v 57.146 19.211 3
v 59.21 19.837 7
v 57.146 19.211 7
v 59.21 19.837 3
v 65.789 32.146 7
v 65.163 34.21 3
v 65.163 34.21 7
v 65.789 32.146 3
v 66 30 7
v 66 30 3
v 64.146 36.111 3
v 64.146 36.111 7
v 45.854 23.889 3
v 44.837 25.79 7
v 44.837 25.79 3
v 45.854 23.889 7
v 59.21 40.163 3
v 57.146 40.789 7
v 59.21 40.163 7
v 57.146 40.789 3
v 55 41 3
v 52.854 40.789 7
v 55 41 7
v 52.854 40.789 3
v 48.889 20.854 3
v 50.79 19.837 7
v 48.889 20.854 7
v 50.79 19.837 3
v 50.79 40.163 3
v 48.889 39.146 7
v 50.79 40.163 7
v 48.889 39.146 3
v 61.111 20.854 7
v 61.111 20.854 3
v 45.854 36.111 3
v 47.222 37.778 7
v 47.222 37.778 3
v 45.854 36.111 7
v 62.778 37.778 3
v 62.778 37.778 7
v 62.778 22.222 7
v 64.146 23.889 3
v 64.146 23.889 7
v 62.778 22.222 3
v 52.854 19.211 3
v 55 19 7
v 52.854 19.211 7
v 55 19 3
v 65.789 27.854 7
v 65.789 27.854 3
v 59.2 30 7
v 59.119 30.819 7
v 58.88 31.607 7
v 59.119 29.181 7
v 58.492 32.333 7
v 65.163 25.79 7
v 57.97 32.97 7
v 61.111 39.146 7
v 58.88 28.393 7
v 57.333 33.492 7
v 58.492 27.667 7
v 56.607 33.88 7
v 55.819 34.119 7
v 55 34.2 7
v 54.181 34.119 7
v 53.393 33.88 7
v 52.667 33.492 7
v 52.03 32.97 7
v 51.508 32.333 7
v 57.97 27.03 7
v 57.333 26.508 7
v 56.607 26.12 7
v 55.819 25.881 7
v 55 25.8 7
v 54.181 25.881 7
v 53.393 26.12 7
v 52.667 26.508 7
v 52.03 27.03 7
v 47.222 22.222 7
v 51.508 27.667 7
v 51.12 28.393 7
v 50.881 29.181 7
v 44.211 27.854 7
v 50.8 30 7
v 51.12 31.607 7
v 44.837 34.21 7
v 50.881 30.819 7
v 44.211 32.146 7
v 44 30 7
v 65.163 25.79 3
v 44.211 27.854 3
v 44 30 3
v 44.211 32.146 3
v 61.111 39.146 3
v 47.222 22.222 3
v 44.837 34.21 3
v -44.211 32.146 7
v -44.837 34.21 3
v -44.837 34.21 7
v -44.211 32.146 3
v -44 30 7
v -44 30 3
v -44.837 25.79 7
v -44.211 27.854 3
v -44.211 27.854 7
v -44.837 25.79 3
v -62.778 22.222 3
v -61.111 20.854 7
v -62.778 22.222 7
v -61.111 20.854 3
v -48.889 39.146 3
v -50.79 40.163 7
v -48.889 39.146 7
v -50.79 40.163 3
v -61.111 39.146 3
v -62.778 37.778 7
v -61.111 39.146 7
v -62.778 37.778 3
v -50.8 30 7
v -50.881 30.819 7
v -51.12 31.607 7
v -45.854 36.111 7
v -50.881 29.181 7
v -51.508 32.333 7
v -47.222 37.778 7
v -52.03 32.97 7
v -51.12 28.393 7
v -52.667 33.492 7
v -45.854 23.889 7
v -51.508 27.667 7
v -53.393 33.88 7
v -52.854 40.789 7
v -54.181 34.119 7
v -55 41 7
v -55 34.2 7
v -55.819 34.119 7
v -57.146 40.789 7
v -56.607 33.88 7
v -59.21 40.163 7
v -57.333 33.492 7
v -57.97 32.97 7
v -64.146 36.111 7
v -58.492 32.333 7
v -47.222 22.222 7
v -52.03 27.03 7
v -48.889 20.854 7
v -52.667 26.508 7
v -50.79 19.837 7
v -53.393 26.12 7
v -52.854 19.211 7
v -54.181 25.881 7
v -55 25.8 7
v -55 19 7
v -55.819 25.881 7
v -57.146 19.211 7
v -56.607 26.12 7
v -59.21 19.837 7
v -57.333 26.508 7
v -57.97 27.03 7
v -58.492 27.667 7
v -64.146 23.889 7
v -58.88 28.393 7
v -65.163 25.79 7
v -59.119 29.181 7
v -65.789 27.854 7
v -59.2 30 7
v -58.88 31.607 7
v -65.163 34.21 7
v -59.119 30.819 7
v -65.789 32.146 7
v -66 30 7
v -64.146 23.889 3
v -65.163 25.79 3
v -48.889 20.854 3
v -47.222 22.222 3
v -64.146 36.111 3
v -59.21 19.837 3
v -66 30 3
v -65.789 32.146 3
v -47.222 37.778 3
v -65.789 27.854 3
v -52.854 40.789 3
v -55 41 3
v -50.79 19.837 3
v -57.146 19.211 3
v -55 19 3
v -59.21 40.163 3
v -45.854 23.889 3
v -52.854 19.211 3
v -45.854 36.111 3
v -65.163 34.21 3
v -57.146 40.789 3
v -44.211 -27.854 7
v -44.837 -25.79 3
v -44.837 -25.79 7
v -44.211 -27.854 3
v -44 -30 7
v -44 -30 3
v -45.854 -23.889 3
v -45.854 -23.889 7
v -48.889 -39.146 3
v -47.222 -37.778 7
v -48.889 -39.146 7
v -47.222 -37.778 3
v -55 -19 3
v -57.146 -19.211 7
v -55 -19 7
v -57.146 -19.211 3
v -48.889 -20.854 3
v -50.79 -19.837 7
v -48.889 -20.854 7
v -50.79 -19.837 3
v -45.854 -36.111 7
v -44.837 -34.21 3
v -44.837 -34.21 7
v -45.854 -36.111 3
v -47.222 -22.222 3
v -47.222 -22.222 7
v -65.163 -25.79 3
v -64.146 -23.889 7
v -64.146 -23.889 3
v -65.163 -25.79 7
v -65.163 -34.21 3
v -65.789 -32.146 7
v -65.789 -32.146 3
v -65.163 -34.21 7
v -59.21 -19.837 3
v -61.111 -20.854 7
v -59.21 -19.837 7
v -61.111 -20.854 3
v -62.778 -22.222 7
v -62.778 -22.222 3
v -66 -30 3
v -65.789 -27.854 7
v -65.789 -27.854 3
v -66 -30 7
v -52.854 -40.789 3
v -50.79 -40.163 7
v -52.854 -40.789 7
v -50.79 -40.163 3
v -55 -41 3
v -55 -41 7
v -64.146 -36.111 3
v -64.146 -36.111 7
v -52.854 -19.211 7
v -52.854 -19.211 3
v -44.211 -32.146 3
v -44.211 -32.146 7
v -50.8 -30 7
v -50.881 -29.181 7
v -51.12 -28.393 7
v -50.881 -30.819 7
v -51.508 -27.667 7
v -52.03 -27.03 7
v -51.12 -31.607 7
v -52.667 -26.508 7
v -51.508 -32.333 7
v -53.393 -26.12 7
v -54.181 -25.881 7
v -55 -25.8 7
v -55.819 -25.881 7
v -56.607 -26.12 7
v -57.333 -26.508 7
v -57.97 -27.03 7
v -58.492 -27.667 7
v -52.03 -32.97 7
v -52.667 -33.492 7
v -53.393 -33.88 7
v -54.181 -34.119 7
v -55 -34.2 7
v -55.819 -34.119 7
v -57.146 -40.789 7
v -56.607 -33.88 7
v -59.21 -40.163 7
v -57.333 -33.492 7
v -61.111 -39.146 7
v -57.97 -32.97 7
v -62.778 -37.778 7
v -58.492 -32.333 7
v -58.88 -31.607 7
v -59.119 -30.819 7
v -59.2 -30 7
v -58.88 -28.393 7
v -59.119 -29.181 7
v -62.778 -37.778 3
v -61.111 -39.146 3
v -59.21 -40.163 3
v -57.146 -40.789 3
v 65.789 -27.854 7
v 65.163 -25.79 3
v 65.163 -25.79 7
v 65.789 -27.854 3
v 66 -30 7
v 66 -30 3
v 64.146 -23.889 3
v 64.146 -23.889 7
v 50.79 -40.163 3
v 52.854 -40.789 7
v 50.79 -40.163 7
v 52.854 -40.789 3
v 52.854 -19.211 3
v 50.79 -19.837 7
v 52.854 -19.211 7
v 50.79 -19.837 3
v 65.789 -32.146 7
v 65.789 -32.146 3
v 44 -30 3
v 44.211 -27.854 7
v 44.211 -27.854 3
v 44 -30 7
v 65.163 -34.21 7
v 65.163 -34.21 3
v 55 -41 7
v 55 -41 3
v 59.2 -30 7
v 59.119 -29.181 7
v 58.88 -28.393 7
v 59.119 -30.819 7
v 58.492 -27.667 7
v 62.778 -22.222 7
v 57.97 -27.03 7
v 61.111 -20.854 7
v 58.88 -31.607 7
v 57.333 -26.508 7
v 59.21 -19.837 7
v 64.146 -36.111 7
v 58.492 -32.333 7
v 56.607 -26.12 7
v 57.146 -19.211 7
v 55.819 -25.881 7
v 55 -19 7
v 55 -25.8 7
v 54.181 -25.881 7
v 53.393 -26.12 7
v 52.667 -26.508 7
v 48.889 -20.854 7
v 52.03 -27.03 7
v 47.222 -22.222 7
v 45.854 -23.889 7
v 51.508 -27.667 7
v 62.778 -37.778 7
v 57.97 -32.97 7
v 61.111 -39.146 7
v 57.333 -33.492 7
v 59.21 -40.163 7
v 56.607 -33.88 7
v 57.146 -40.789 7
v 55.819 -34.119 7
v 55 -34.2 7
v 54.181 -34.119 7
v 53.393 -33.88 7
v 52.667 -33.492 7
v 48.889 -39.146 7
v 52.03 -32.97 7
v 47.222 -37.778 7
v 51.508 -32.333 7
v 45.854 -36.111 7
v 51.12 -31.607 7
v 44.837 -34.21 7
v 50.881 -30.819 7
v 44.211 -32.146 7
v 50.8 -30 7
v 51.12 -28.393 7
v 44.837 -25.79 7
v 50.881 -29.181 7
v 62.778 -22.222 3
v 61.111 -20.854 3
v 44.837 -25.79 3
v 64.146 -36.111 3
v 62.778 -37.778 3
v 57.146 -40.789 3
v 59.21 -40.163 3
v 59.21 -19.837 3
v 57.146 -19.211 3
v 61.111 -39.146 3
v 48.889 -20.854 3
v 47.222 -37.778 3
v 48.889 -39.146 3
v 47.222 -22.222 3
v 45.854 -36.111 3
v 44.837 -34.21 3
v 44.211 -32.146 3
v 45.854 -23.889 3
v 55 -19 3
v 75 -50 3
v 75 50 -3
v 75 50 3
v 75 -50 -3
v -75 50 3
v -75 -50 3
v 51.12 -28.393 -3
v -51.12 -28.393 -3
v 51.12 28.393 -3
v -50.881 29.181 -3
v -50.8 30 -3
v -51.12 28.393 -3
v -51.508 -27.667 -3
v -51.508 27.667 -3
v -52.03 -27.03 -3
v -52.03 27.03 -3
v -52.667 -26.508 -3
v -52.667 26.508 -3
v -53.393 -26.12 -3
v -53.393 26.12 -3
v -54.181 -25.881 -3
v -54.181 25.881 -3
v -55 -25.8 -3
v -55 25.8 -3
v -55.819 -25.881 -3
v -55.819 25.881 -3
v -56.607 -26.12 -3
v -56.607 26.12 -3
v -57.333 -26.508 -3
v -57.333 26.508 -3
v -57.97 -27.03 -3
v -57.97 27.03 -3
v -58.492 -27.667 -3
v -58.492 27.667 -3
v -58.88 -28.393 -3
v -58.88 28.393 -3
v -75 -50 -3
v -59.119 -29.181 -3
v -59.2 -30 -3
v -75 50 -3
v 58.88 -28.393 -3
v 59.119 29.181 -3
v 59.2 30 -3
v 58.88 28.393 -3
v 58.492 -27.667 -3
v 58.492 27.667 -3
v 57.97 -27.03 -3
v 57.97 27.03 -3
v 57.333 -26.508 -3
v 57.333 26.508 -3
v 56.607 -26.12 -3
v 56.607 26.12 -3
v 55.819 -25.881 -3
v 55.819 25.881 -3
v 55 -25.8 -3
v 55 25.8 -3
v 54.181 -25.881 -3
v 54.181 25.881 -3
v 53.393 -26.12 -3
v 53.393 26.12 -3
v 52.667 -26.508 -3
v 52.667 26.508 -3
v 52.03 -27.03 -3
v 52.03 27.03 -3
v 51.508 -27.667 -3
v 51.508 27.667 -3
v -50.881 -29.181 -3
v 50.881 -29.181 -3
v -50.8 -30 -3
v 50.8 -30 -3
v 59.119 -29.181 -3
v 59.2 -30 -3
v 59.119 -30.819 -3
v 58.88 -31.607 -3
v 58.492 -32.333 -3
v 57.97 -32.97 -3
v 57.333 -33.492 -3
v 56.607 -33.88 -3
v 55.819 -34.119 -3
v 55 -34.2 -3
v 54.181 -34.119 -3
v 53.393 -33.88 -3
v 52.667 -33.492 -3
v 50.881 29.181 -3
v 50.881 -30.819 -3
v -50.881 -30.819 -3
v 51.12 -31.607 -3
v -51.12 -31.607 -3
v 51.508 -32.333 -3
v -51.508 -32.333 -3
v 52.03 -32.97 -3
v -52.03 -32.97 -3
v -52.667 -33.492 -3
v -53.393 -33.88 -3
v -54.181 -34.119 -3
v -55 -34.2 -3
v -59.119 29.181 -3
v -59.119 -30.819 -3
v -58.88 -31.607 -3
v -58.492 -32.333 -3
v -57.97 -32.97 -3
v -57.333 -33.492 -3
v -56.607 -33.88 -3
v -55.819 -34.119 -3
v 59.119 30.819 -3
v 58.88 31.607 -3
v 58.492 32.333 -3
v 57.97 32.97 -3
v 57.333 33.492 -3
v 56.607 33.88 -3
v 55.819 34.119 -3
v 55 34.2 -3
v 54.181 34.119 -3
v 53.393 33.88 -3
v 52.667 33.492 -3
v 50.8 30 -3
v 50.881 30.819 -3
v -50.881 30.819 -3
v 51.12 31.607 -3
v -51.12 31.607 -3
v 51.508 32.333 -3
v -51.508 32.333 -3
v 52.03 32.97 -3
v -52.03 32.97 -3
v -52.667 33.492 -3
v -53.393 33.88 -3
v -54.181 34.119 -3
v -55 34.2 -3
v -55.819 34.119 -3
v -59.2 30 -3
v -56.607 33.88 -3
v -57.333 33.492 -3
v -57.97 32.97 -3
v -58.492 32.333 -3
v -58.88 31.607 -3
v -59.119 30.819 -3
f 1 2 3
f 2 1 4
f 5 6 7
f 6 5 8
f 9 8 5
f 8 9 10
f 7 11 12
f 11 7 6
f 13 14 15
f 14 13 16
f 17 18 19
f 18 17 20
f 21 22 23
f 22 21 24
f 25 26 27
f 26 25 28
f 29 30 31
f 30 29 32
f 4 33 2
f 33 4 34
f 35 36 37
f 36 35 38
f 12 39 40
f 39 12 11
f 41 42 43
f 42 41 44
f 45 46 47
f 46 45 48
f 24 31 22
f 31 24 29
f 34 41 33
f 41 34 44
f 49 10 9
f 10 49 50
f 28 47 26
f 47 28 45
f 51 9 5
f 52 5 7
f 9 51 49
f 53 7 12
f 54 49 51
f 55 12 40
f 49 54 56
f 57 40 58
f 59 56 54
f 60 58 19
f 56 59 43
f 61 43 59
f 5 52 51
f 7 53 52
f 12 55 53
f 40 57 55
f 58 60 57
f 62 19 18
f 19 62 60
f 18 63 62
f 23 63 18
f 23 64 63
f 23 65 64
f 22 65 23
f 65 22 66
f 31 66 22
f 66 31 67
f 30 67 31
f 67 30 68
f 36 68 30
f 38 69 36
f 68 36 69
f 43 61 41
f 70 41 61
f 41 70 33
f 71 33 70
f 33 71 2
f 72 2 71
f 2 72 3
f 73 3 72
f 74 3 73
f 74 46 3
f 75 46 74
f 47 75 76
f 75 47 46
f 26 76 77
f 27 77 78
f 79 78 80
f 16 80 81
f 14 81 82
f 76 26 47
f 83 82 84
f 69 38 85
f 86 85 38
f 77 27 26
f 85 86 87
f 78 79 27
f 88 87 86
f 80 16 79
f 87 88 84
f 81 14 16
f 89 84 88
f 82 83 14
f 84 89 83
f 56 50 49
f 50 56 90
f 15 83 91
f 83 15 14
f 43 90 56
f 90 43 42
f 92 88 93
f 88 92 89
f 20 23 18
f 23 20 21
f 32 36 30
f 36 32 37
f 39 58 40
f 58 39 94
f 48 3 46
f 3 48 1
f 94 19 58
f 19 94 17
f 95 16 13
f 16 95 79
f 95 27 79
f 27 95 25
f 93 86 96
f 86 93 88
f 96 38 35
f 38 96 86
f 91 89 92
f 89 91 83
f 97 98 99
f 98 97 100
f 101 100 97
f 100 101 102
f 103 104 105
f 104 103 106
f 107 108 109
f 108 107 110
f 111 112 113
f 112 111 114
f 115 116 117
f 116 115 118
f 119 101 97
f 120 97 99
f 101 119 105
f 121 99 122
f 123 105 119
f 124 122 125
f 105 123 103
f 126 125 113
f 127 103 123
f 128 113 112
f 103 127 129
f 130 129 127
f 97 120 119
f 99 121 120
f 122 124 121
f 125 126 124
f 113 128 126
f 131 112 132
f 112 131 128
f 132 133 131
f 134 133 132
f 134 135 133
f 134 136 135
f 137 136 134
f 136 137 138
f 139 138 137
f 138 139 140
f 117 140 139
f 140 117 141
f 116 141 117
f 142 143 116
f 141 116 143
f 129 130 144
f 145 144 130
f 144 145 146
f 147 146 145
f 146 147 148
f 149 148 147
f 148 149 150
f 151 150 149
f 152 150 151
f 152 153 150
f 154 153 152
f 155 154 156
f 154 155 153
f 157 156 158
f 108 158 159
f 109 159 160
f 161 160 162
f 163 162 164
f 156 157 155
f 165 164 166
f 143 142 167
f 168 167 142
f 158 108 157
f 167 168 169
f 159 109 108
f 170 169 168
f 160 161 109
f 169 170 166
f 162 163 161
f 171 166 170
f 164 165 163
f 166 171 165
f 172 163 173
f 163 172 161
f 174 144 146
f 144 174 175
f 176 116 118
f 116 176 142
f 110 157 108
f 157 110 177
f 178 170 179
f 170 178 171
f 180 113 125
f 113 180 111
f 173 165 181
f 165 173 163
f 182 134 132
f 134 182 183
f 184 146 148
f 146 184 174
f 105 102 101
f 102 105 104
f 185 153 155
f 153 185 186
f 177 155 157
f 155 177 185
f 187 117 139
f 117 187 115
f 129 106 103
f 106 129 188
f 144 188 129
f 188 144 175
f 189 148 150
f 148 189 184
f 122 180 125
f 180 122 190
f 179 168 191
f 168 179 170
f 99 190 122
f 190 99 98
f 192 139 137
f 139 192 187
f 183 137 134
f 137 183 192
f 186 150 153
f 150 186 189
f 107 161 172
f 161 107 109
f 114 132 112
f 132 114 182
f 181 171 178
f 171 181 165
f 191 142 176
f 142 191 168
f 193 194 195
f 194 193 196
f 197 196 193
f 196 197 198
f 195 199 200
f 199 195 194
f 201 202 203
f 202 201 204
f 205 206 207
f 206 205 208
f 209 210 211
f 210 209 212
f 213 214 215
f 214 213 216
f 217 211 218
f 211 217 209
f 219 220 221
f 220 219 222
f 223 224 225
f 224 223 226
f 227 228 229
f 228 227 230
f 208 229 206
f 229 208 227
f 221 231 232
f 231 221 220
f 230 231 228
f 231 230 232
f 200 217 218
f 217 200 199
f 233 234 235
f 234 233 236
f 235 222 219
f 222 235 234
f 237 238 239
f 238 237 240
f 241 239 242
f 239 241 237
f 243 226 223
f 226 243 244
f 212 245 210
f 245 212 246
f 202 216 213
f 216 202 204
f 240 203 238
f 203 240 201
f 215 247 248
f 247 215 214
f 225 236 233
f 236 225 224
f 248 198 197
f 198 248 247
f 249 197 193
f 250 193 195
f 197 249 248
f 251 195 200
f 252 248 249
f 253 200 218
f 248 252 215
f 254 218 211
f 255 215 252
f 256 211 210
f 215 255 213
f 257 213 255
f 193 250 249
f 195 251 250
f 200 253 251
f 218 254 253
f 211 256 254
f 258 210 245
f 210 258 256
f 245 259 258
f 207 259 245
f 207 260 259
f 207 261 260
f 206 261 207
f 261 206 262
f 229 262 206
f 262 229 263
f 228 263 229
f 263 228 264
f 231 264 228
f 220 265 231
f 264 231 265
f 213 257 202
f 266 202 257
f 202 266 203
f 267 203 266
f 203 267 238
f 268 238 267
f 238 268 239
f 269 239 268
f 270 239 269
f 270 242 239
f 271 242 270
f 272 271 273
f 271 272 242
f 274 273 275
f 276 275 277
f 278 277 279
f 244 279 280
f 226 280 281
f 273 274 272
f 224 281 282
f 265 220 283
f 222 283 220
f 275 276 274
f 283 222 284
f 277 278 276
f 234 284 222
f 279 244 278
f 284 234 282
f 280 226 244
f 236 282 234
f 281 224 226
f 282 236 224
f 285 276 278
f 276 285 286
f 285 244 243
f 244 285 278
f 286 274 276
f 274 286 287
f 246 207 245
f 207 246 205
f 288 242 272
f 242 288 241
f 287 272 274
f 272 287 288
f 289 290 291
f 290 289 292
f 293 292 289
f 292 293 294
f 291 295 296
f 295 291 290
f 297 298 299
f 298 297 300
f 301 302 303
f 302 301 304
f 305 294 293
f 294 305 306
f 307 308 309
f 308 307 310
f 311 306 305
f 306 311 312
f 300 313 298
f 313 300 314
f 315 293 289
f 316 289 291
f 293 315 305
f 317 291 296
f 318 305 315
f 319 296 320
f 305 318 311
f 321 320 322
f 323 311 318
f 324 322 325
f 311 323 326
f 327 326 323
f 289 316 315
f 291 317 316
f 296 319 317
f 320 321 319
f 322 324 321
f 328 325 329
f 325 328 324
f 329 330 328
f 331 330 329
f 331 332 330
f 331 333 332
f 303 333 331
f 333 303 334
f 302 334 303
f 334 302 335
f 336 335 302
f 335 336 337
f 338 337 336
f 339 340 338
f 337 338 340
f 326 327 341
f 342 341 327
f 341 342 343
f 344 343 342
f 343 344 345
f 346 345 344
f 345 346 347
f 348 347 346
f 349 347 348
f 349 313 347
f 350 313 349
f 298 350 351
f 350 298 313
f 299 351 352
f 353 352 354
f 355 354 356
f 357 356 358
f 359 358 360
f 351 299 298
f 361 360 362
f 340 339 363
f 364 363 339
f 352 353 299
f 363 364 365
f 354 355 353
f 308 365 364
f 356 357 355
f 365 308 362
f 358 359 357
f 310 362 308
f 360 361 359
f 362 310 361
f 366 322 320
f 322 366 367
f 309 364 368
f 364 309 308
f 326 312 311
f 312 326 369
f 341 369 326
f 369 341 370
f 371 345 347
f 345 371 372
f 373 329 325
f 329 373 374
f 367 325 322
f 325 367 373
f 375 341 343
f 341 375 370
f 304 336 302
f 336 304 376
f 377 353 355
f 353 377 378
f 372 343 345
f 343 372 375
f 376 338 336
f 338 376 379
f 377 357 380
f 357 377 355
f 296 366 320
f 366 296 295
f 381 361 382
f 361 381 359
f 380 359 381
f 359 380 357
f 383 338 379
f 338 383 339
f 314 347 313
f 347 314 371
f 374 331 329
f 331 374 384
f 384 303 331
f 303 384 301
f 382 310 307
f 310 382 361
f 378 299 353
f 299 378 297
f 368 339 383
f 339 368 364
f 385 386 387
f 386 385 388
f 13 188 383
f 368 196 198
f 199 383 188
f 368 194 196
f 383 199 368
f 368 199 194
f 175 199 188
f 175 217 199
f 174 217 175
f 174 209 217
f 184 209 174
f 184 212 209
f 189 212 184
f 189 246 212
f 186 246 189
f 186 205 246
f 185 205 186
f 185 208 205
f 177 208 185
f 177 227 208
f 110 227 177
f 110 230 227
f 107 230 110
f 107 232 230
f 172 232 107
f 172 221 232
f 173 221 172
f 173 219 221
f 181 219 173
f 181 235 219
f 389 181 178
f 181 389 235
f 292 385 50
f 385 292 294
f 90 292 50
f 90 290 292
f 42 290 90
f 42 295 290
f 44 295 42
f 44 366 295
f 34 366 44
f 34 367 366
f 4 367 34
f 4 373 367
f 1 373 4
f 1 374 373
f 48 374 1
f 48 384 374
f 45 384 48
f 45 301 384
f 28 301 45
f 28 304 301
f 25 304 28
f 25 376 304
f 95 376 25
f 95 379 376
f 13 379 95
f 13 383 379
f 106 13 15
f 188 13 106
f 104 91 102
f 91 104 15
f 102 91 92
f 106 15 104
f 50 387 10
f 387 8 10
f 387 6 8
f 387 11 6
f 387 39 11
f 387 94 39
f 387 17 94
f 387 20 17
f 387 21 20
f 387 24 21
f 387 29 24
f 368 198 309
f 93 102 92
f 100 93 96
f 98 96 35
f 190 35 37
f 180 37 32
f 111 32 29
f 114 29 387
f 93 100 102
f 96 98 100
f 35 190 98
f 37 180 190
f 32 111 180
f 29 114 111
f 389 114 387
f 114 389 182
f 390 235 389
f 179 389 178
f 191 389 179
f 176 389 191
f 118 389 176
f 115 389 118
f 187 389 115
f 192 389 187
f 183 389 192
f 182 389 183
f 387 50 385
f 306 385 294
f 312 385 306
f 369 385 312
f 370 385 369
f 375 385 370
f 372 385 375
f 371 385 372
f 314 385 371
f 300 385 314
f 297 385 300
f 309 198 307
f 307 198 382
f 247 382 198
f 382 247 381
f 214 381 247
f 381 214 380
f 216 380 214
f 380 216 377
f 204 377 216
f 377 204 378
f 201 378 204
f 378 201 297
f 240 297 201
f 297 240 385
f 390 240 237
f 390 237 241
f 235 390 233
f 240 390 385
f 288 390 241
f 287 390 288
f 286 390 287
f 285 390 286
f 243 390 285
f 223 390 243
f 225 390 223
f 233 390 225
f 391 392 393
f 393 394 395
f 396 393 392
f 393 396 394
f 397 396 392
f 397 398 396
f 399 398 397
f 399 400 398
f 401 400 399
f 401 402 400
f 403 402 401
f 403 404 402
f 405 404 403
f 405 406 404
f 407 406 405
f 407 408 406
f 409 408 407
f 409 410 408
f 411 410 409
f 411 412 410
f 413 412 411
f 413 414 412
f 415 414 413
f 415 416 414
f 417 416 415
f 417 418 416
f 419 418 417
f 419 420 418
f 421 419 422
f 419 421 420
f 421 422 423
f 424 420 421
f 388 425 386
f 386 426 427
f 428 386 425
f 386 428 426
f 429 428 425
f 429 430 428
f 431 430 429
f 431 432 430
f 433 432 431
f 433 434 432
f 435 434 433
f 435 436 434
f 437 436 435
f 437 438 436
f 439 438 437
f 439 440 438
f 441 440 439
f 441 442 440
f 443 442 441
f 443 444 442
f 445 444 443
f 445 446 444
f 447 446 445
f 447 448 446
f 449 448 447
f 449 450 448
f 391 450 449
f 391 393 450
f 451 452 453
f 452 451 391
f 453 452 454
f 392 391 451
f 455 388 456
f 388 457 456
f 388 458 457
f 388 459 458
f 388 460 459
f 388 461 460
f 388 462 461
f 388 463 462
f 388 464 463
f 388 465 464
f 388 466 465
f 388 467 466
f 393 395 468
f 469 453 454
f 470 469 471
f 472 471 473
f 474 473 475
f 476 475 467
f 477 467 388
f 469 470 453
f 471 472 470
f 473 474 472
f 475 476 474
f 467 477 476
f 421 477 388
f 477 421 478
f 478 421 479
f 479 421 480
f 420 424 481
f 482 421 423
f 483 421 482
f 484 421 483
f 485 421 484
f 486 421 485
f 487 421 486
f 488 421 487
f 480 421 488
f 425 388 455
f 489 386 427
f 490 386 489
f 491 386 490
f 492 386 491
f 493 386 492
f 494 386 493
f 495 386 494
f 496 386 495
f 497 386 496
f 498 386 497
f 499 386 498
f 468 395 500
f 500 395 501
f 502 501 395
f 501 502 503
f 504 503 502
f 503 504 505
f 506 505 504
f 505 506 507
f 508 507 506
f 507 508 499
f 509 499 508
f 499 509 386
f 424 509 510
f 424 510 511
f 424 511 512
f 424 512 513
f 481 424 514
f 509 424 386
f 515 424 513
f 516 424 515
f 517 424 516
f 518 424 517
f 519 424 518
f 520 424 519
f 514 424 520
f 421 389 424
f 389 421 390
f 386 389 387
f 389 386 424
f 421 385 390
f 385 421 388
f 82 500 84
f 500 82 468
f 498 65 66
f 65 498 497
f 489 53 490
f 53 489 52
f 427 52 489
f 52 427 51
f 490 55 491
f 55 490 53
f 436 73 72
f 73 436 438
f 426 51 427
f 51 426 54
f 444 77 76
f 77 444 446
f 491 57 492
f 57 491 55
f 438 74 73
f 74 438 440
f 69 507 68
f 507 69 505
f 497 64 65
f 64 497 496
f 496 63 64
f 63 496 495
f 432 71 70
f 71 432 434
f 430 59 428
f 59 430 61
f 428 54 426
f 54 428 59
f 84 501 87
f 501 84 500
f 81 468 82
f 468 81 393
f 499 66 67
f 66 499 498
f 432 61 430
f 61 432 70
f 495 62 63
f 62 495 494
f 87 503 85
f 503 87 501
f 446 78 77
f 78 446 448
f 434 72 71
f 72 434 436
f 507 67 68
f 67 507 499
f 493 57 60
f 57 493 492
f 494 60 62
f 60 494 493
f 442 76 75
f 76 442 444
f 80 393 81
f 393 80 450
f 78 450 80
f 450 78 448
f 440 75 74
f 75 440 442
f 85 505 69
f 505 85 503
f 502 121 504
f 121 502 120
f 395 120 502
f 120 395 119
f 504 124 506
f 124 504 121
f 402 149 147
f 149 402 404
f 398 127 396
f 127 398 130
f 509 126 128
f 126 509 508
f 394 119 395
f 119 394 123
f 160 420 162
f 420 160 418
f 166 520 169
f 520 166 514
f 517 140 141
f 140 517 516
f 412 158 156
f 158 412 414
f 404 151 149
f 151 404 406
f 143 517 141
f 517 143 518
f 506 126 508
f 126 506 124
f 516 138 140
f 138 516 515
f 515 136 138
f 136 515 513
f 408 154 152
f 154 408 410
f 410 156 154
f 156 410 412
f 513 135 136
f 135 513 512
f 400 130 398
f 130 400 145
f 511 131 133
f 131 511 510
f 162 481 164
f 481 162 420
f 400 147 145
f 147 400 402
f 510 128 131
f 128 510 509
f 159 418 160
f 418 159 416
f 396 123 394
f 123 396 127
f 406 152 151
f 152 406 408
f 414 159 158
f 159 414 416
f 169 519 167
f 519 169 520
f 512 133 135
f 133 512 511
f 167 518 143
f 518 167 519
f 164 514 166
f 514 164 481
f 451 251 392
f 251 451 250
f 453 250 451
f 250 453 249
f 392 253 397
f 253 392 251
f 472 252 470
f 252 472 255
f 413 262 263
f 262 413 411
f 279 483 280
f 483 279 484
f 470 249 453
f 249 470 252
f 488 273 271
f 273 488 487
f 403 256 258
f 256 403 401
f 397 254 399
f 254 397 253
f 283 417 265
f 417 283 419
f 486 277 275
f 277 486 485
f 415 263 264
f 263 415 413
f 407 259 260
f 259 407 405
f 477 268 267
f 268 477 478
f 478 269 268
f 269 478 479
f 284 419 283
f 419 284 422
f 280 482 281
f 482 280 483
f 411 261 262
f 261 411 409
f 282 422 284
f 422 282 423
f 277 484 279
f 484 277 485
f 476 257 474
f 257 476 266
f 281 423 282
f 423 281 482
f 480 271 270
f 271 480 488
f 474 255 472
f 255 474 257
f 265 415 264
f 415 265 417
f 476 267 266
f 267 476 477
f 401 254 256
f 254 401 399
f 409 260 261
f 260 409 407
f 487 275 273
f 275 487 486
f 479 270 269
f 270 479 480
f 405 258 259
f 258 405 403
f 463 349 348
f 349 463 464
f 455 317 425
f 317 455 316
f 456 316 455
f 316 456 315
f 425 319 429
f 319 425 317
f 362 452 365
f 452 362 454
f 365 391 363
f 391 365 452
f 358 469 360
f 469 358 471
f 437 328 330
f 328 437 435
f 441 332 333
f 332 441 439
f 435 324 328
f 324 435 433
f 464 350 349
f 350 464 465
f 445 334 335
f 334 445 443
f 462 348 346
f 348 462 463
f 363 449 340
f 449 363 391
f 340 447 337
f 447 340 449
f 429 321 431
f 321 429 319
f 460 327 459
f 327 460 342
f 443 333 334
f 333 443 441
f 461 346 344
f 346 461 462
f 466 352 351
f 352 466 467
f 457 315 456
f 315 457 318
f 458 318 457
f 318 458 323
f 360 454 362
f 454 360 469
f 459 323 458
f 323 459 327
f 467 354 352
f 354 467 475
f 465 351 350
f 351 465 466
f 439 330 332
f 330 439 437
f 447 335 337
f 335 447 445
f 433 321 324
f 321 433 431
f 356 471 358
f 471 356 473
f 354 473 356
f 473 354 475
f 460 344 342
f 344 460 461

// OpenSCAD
$fn = 32;

// ----------------------------------------------------------------------
// Anchor pads 150 x 100 x 10
// four corner bosses with anchor holes
// ----------------------------------------------------------------------

// --- parameters (mm) ---
plate = [150, 100, 6];  // base plate size (x, y, z)
pads = 4;               // boss count, one per corner
edge = 20;              // boss centre offset from the plate edge
boss_d = 22;            // boss diameter
boss_h = 4;             // boss height above the base plate
hole_d = 8.4;           // hole diameter

// --- derived feature positions (mm) ---
height = plate[2] + boss_h;      // = 10   overall height of the part
corner_x = plate[0] / 2 - edge;  // = 55   boss centre X
corner_y = plate[1] / 2 - edge;  // = 30   boss centre Y
feature_centers = [
  [corner_x, corner_y],
  [-corner_x, corner_y],
  [-corner_x, -corner_y],
  [corner_x, -corner_y]
];   // boss centres, anchor holes are drilled there

// base plate, four bosses standing on it, anchor holes all the way through
difference() {
  union() {
    cube(plate, center = true);
    for (centre = feature_centers)
      translate([centre[0], centre[1], plate[2] / 2 - 1])
        cylinder(d = boss_d, h = boss_h + 1);
  }
  for (centre = feature_centers)
    translate([centre[0], centre[1], -height])
      cylinder(d = hole_d, h = 2 * height + 2);  // through boss and plate
}
